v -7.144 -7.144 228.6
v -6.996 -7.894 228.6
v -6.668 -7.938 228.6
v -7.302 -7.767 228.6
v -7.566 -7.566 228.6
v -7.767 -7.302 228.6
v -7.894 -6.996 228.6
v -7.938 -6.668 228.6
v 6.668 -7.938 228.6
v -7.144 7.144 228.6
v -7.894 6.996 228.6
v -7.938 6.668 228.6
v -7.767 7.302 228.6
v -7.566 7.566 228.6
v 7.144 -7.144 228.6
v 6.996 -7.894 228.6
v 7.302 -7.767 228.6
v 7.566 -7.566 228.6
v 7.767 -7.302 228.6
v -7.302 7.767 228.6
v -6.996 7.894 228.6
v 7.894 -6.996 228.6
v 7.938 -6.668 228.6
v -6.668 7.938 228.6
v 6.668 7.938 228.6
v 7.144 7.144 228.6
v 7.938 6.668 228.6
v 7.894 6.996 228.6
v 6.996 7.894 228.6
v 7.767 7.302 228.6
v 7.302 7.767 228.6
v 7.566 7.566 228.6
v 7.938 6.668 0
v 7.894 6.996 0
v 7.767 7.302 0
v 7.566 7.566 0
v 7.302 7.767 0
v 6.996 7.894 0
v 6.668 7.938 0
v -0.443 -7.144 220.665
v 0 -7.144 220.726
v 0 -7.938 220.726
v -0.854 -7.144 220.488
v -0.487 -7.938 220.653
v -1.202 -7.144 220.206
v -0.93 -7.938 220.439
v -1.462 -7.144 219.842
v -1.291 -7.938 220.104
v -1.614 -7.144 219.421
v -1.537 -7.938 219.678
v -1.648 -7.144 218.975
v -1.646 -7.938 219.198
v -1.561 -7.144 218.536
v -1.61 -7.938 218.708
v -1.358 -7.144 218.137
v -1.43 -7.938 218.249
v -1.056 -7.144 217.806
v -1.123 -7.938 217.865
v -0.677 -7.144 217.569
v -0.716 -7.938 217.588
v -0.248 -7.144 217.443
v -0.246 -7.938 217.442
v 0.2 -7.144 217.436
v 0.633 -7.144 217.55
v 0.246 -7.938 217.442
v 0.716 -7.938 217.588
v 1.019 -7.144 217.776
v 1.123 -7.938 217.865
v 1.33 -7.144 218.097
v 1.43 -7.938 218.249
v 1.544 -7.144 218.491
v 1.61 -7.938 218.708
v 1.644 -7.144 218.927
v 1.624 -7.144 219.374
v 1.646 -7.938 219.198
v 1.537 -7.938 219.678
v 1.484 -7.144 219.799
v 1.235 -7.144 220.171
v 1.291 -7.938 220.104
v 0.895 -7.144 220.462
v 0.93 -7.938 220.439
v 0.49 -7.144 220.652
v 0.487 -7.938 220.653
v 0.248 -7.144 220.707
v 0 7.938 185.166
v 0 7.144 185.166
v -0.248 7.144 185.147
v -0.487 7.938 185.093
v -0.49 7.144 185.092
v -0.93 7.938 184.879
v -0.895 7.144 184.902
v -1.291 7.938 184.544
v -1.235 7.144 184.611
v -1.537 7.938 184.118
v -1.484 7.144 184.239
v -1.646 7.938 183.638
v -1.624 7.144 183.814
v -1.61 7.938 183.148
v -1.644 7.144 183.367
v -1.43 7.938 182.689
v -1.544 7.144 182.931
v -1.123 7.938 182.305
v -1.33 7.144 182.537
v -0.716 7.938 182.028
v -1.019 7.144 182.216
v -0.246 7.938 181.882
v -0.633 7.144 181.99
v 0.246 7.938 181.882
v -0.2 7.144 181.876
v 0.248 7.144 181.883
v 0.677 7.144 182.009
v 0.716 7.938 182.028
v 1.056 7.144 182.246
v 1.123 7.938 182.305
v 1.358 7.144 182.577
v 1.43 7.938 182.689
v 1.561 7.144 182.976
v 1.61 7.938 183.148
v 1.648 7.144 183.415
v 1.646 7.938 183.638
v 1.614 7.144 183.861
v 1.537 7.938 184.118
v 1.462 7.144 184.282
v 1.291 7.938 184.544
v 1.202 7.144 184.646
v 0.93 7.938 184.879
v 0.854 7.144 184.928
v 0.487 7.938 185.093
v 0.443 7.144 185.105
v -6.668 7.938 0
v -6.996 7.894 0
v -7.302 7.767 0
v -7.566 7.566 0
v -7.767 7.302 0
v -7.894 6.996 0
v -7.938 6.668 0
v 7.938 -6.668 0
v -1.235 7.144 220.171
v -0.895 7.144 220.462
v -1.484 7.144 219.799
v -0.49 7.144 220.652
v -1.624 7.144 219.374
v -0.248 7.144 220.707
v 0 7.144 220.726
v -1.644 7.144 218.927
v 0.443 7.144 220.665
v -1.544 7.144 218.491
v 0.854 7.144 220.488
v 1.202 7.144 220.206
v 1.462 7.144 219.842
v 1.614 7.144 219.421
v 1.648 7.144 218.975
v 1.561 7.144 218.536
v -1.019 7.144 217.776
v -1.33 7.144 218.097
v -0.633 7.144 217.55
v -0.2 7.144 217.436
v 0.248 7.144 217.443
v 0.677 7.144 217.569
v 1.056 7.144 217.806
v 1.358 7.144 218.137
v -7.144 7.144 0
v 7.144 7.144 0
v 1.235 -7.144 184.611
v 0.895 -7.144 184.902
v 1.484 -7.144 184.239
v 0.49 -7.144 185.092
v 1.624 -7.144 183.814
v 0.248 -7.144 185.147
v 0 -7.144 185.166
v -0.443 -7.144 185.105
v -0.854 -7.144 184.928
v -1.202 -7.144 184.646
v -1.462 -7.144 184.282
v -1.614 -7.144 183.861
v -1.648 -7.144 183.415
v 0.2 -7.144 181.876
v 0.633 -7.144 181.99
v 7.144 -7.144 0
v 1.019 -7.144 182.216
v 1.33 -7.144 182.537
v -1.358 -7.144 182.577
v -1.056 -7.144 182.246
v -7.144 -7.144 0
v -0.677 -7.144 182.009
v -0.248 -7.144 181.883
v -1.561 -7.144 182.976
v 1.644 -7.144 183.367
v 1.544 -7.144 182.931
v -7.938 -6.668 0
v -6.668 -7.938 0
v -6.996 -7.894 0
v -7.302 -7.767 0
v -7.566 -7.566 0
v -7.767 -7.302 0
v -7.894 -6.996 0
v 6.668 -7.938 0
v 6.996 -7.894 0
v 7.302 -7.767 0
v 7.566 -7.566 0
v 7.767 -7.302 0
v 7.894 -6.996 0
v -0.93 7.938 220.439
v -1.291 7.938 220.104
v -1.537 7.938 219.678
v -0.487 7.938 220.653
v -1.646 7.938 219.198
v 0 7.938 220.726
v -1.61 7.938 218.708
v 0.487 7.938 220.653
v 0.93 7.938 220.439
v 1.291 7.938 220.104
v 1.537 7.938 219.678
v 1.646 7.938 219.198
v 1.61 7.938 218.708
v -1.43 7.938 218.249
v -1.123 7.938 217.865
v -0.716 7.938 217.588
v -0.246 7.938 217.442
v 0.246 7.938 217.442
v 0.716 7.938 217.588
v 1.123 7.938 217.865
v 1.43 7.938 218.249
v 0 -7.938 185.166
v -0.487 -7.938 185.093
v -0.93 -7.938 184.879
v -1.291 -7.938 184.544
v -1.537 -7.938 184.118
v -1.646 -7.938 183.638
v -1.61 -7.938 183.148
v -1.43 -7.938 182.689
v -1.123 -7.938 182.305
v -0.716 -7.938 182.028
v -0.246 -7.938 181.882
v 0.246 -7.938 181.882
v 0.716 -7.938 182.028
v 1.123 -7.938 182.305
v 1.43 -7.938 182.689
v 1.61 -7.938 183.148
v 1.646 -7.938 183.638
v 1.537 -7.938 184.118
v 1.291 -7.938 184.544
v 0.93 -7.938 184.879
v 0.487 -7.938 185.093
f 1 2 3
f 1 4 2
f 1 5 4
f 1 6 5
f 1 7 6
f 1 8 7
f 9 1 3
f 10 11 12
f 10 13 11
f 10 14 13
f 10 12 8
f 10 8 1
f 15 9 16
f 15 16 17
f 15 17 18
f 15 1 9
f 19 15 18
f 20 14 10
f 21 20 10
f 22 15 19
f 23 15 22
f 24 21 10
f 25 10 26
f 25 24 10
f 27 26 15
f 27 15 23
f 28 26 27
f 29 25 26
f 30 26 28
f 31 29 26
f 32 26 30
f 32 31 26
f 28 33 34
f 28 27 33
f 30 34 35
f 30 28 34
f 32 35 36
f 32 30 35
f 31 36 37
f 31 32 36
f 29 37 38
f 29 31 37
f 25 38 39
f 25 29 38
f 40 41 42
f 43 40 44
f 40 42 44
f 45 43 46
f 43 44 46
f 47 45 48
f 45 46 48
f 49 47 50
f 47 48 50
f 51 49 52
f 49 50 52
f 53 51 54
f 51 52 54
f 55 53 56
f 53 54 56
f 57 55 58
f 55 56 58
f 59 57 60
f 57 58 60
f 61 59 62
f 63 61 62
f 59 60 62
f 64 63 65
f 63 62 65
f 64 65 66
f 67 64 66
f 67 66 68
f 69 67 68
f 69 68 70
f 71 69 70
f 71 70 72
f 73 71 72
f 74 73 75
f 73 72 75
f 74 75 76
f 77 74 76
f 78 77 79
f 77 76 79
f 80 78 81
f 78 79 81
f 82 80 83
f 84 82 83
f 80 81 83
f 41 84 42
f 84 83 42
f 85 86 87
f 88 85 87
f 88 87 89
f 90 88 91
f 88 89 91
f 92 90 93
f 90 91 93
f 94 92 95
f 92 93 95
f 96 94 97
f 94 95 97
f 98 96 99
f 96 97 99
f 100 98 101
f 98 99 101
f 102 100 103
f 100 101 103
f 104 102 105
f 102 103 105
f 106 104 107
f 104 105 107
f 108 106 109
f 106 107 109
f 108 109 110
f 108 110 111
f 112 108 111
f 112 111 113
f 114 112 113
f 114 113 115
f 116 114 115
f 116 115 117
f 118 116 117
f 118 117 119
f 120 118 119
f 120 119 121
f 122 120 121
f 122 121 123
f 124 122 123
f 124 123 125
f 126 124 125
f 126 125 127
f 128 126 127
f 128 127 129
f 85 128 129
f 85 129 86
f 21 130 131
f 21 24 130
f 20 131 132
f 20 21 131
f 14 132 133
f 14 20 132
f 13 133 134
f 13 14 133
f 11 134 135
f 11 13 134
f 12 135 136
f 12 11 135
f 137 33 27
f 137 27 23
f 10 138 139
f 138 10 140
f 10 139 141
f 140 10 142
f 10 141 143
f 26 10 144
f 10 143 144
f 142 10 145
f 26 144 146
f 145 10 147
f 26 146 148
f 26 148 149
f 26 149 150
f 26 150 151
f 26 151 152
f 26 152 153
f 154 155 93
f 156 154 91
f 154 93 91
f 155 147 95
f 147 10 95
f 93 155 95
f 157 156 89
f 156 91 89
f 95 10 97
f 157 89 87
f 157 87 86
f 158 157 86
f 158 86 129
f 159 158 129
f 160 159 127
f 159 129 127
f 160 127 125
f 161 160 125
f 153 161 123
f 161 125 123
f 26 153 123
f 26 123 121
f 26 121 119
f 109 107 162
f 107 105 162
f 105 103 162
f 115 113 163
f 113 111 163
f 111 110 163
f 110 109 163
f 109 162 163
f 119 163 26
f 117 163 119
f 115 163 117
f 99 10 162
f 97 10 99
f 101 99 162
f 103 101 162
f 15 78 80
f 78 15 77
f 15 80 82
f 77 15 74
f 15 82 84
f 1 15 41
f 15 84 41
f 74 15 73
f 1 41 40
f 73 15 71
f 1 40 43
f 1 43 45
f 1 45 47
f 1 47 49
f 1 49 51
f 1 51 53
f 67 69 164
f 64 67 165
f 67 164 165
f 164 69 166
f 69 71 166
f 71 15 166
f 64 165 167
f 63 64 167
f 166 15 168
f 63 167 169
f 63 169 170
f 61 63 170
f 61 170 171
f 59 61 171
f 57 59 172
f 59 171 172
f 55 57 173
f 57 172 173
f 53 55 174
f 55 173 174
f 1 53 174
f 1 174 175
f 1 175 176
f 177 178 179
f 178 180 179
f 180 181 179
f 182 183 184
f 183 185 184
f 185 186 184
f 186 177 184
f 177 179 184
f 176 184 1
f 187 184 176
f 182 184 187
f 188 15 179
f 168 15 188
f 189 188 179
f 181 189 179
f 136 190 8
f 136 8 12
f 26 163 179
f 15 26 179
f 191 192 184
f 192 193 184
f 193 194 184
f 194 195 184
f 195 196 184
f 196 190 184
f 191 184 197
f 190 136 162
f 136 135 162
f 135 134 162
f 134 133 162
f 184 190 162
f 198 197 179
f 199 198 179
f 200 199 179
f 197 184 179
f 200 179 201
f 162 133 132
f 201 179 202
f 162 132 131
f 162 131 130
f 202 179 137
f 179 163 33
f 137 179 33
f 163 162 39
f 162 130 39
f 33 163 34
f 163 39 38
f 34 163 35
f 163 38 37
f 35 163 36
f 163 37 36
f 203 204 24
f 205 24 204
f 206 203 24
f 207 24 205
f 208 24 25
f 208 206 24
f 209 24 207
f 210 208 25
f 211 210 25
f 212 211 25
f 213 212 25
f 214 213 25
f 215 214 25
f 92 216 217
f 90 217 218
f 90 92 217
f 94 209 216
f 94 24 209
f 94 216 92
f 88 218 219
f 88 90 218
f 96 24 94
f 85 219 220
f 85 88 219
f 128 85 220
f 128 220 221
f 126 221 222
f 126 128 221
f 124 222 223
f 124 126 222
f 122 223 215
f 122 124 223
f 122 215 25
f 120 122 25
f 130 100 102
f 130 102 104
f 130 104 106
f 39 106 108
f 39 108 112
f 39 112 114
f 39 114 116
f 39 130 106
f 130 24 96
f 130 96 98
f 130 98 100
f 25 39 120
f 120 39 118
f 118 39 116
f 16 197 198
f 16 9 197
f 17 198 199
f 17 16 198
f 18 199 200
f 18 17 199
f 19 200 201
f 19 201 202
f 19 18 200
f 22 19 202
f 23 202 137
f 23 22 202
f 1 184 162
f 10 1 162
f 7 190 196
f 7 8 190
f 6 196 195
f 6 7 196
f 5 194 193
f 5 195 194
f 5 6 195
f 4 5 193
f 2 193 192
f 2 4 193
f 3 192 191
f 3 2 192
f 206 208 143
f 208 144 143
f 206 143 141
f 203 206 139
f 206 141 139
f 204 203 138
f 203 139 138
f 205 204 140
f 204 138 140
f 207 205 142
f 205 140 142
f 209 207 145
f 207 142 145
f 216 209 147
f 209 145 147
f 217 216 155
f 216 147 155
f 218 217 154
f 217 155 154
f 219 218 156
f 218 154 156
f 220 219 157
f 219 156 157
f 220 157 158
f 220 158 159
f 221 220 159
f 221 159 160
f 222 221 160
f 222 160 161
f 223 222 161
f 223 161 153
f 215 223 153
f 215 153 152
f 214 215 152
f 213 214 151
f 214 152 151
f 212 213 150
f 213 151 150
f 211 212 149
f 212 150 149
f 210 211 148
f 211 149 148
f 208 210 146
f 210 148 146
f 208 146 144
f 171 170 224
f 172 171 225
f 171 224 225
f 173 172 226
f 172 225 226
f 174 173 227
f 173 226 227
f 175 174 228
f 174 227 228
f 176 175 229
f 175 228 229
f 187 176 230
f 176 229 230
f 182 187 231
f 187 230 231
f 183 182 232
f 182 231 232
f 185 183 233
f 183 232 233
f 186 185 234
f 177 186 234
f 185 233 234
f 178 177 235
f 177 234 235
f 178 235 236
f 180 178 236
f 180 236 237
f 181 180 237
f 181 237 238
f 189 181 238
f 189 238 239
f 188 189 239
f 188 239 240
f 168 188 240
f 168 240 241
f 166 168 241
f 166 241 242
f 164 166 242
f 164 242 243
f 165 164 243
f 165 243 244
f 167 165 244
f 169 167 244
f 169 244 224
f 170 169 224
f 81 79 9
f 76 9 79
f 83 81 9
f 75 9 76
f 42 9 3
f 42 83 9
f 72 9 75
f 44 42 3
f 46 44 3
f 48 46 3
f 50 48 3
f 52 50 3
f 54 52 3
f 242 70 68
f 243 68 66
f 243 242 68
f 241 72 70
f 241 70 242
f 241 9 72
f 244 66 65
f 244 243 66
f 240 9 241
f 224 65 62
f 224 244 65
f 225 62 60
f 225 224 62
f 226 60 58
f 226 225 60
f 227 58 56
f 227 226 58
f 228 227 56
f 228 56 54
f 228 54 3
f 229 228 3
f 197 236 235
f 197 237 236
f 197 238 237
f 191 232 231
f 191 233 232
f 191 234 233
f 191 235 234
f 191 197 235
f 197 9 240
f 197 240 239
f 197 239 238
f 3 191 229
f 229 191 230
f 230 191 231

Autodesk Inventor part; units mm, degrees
ref_plane "YZ Plane" through (0, 0, 0) normal (1, 0, 0) x (0, 1, 0)
ref_plane "XZ Plane" through (0, 0, 0) normal (0, 1, 0) x (-1, 0, 0)
ref_plane "XY Plane" through (0, 0, 0) normal (0, 0, 1) x (1, 0, 0)
sketch "Sketch1" plane through (0, 0, 0) normal (0, 0, 1) x (1, 0, 0)
  line L0 (7.9375, -7.9375) -> (-7.9375, -7.9375)
  line L1 (-7.9375, -7.9375) -> (-7.9375, 7.9375)
  line L2 (-7.9375, 7.9375) -> (7.9375, 7.9375)
  line L3 (7.9375, 7.9375) -> (7.9375, -7.9375)
  line L4 (-7.1437, -7.1438) -> (-7.1437, 7.1437)
  line L5 (-7.1437, 7.1437) -> (7.1437, 7.1438)
  line L6 (7.1437, 7.1438) -> (7.1438, -7.1437)
  line L7 (7.1438, -7.1437) -> (-7.1437, -7.1438)
  line L8 (0, 0) -> (5.5522, 0)
  point P0 (0, 0)
  point P1 (0, 0)
  point P2 (0, 0)
  dimension "d4" = 45
  dimension "d5" = 14.2875
  dimension "d6" = 15.875
extrude "Extrusion1" add sketch "Sketch1" along normal blind 228.6
sketch "Sketch2" plane through (-7.9375, 7.9375, 0) normal (0, 1, 0) x (1, 0, 0)
  line L0 (0, -228.6) -> (15.875, -228.6) projected
  line L1 (15.875, 0) -> (15.875, -228.6) projected
  line L2 (0, 0) -> (0, -228.6) projected
  line L3 (7.9375, -228.6) -> (7.9375, -257.0929)
  line L4 (7.9375, -219.075) -> (26.9875, -219.075) construction
  point P0 (7.9375, 0)
  point P1 (7.9375, -183.515)
  dimension "d27" = 9.525
  dimension "d30" = 35.56
hole "Hole1" at (0, 7.9375, 219.075) at (0, 7.9375, 183.515) direction (0, -1, 0) diameter 3.302 end through all thread size "8-32 UNC" class "2B" standard "ANSI Unified Screw Threads"
fillet "Fillet1" radius 1.27 4 edges at (-7.9375, 7.9375, 114.3) (7.9375, 7.9375, 114.3) (7.9375, -7.9375, 114.3) (-7.9375, -7.9375, 114.3)
properties part number "Arm"
